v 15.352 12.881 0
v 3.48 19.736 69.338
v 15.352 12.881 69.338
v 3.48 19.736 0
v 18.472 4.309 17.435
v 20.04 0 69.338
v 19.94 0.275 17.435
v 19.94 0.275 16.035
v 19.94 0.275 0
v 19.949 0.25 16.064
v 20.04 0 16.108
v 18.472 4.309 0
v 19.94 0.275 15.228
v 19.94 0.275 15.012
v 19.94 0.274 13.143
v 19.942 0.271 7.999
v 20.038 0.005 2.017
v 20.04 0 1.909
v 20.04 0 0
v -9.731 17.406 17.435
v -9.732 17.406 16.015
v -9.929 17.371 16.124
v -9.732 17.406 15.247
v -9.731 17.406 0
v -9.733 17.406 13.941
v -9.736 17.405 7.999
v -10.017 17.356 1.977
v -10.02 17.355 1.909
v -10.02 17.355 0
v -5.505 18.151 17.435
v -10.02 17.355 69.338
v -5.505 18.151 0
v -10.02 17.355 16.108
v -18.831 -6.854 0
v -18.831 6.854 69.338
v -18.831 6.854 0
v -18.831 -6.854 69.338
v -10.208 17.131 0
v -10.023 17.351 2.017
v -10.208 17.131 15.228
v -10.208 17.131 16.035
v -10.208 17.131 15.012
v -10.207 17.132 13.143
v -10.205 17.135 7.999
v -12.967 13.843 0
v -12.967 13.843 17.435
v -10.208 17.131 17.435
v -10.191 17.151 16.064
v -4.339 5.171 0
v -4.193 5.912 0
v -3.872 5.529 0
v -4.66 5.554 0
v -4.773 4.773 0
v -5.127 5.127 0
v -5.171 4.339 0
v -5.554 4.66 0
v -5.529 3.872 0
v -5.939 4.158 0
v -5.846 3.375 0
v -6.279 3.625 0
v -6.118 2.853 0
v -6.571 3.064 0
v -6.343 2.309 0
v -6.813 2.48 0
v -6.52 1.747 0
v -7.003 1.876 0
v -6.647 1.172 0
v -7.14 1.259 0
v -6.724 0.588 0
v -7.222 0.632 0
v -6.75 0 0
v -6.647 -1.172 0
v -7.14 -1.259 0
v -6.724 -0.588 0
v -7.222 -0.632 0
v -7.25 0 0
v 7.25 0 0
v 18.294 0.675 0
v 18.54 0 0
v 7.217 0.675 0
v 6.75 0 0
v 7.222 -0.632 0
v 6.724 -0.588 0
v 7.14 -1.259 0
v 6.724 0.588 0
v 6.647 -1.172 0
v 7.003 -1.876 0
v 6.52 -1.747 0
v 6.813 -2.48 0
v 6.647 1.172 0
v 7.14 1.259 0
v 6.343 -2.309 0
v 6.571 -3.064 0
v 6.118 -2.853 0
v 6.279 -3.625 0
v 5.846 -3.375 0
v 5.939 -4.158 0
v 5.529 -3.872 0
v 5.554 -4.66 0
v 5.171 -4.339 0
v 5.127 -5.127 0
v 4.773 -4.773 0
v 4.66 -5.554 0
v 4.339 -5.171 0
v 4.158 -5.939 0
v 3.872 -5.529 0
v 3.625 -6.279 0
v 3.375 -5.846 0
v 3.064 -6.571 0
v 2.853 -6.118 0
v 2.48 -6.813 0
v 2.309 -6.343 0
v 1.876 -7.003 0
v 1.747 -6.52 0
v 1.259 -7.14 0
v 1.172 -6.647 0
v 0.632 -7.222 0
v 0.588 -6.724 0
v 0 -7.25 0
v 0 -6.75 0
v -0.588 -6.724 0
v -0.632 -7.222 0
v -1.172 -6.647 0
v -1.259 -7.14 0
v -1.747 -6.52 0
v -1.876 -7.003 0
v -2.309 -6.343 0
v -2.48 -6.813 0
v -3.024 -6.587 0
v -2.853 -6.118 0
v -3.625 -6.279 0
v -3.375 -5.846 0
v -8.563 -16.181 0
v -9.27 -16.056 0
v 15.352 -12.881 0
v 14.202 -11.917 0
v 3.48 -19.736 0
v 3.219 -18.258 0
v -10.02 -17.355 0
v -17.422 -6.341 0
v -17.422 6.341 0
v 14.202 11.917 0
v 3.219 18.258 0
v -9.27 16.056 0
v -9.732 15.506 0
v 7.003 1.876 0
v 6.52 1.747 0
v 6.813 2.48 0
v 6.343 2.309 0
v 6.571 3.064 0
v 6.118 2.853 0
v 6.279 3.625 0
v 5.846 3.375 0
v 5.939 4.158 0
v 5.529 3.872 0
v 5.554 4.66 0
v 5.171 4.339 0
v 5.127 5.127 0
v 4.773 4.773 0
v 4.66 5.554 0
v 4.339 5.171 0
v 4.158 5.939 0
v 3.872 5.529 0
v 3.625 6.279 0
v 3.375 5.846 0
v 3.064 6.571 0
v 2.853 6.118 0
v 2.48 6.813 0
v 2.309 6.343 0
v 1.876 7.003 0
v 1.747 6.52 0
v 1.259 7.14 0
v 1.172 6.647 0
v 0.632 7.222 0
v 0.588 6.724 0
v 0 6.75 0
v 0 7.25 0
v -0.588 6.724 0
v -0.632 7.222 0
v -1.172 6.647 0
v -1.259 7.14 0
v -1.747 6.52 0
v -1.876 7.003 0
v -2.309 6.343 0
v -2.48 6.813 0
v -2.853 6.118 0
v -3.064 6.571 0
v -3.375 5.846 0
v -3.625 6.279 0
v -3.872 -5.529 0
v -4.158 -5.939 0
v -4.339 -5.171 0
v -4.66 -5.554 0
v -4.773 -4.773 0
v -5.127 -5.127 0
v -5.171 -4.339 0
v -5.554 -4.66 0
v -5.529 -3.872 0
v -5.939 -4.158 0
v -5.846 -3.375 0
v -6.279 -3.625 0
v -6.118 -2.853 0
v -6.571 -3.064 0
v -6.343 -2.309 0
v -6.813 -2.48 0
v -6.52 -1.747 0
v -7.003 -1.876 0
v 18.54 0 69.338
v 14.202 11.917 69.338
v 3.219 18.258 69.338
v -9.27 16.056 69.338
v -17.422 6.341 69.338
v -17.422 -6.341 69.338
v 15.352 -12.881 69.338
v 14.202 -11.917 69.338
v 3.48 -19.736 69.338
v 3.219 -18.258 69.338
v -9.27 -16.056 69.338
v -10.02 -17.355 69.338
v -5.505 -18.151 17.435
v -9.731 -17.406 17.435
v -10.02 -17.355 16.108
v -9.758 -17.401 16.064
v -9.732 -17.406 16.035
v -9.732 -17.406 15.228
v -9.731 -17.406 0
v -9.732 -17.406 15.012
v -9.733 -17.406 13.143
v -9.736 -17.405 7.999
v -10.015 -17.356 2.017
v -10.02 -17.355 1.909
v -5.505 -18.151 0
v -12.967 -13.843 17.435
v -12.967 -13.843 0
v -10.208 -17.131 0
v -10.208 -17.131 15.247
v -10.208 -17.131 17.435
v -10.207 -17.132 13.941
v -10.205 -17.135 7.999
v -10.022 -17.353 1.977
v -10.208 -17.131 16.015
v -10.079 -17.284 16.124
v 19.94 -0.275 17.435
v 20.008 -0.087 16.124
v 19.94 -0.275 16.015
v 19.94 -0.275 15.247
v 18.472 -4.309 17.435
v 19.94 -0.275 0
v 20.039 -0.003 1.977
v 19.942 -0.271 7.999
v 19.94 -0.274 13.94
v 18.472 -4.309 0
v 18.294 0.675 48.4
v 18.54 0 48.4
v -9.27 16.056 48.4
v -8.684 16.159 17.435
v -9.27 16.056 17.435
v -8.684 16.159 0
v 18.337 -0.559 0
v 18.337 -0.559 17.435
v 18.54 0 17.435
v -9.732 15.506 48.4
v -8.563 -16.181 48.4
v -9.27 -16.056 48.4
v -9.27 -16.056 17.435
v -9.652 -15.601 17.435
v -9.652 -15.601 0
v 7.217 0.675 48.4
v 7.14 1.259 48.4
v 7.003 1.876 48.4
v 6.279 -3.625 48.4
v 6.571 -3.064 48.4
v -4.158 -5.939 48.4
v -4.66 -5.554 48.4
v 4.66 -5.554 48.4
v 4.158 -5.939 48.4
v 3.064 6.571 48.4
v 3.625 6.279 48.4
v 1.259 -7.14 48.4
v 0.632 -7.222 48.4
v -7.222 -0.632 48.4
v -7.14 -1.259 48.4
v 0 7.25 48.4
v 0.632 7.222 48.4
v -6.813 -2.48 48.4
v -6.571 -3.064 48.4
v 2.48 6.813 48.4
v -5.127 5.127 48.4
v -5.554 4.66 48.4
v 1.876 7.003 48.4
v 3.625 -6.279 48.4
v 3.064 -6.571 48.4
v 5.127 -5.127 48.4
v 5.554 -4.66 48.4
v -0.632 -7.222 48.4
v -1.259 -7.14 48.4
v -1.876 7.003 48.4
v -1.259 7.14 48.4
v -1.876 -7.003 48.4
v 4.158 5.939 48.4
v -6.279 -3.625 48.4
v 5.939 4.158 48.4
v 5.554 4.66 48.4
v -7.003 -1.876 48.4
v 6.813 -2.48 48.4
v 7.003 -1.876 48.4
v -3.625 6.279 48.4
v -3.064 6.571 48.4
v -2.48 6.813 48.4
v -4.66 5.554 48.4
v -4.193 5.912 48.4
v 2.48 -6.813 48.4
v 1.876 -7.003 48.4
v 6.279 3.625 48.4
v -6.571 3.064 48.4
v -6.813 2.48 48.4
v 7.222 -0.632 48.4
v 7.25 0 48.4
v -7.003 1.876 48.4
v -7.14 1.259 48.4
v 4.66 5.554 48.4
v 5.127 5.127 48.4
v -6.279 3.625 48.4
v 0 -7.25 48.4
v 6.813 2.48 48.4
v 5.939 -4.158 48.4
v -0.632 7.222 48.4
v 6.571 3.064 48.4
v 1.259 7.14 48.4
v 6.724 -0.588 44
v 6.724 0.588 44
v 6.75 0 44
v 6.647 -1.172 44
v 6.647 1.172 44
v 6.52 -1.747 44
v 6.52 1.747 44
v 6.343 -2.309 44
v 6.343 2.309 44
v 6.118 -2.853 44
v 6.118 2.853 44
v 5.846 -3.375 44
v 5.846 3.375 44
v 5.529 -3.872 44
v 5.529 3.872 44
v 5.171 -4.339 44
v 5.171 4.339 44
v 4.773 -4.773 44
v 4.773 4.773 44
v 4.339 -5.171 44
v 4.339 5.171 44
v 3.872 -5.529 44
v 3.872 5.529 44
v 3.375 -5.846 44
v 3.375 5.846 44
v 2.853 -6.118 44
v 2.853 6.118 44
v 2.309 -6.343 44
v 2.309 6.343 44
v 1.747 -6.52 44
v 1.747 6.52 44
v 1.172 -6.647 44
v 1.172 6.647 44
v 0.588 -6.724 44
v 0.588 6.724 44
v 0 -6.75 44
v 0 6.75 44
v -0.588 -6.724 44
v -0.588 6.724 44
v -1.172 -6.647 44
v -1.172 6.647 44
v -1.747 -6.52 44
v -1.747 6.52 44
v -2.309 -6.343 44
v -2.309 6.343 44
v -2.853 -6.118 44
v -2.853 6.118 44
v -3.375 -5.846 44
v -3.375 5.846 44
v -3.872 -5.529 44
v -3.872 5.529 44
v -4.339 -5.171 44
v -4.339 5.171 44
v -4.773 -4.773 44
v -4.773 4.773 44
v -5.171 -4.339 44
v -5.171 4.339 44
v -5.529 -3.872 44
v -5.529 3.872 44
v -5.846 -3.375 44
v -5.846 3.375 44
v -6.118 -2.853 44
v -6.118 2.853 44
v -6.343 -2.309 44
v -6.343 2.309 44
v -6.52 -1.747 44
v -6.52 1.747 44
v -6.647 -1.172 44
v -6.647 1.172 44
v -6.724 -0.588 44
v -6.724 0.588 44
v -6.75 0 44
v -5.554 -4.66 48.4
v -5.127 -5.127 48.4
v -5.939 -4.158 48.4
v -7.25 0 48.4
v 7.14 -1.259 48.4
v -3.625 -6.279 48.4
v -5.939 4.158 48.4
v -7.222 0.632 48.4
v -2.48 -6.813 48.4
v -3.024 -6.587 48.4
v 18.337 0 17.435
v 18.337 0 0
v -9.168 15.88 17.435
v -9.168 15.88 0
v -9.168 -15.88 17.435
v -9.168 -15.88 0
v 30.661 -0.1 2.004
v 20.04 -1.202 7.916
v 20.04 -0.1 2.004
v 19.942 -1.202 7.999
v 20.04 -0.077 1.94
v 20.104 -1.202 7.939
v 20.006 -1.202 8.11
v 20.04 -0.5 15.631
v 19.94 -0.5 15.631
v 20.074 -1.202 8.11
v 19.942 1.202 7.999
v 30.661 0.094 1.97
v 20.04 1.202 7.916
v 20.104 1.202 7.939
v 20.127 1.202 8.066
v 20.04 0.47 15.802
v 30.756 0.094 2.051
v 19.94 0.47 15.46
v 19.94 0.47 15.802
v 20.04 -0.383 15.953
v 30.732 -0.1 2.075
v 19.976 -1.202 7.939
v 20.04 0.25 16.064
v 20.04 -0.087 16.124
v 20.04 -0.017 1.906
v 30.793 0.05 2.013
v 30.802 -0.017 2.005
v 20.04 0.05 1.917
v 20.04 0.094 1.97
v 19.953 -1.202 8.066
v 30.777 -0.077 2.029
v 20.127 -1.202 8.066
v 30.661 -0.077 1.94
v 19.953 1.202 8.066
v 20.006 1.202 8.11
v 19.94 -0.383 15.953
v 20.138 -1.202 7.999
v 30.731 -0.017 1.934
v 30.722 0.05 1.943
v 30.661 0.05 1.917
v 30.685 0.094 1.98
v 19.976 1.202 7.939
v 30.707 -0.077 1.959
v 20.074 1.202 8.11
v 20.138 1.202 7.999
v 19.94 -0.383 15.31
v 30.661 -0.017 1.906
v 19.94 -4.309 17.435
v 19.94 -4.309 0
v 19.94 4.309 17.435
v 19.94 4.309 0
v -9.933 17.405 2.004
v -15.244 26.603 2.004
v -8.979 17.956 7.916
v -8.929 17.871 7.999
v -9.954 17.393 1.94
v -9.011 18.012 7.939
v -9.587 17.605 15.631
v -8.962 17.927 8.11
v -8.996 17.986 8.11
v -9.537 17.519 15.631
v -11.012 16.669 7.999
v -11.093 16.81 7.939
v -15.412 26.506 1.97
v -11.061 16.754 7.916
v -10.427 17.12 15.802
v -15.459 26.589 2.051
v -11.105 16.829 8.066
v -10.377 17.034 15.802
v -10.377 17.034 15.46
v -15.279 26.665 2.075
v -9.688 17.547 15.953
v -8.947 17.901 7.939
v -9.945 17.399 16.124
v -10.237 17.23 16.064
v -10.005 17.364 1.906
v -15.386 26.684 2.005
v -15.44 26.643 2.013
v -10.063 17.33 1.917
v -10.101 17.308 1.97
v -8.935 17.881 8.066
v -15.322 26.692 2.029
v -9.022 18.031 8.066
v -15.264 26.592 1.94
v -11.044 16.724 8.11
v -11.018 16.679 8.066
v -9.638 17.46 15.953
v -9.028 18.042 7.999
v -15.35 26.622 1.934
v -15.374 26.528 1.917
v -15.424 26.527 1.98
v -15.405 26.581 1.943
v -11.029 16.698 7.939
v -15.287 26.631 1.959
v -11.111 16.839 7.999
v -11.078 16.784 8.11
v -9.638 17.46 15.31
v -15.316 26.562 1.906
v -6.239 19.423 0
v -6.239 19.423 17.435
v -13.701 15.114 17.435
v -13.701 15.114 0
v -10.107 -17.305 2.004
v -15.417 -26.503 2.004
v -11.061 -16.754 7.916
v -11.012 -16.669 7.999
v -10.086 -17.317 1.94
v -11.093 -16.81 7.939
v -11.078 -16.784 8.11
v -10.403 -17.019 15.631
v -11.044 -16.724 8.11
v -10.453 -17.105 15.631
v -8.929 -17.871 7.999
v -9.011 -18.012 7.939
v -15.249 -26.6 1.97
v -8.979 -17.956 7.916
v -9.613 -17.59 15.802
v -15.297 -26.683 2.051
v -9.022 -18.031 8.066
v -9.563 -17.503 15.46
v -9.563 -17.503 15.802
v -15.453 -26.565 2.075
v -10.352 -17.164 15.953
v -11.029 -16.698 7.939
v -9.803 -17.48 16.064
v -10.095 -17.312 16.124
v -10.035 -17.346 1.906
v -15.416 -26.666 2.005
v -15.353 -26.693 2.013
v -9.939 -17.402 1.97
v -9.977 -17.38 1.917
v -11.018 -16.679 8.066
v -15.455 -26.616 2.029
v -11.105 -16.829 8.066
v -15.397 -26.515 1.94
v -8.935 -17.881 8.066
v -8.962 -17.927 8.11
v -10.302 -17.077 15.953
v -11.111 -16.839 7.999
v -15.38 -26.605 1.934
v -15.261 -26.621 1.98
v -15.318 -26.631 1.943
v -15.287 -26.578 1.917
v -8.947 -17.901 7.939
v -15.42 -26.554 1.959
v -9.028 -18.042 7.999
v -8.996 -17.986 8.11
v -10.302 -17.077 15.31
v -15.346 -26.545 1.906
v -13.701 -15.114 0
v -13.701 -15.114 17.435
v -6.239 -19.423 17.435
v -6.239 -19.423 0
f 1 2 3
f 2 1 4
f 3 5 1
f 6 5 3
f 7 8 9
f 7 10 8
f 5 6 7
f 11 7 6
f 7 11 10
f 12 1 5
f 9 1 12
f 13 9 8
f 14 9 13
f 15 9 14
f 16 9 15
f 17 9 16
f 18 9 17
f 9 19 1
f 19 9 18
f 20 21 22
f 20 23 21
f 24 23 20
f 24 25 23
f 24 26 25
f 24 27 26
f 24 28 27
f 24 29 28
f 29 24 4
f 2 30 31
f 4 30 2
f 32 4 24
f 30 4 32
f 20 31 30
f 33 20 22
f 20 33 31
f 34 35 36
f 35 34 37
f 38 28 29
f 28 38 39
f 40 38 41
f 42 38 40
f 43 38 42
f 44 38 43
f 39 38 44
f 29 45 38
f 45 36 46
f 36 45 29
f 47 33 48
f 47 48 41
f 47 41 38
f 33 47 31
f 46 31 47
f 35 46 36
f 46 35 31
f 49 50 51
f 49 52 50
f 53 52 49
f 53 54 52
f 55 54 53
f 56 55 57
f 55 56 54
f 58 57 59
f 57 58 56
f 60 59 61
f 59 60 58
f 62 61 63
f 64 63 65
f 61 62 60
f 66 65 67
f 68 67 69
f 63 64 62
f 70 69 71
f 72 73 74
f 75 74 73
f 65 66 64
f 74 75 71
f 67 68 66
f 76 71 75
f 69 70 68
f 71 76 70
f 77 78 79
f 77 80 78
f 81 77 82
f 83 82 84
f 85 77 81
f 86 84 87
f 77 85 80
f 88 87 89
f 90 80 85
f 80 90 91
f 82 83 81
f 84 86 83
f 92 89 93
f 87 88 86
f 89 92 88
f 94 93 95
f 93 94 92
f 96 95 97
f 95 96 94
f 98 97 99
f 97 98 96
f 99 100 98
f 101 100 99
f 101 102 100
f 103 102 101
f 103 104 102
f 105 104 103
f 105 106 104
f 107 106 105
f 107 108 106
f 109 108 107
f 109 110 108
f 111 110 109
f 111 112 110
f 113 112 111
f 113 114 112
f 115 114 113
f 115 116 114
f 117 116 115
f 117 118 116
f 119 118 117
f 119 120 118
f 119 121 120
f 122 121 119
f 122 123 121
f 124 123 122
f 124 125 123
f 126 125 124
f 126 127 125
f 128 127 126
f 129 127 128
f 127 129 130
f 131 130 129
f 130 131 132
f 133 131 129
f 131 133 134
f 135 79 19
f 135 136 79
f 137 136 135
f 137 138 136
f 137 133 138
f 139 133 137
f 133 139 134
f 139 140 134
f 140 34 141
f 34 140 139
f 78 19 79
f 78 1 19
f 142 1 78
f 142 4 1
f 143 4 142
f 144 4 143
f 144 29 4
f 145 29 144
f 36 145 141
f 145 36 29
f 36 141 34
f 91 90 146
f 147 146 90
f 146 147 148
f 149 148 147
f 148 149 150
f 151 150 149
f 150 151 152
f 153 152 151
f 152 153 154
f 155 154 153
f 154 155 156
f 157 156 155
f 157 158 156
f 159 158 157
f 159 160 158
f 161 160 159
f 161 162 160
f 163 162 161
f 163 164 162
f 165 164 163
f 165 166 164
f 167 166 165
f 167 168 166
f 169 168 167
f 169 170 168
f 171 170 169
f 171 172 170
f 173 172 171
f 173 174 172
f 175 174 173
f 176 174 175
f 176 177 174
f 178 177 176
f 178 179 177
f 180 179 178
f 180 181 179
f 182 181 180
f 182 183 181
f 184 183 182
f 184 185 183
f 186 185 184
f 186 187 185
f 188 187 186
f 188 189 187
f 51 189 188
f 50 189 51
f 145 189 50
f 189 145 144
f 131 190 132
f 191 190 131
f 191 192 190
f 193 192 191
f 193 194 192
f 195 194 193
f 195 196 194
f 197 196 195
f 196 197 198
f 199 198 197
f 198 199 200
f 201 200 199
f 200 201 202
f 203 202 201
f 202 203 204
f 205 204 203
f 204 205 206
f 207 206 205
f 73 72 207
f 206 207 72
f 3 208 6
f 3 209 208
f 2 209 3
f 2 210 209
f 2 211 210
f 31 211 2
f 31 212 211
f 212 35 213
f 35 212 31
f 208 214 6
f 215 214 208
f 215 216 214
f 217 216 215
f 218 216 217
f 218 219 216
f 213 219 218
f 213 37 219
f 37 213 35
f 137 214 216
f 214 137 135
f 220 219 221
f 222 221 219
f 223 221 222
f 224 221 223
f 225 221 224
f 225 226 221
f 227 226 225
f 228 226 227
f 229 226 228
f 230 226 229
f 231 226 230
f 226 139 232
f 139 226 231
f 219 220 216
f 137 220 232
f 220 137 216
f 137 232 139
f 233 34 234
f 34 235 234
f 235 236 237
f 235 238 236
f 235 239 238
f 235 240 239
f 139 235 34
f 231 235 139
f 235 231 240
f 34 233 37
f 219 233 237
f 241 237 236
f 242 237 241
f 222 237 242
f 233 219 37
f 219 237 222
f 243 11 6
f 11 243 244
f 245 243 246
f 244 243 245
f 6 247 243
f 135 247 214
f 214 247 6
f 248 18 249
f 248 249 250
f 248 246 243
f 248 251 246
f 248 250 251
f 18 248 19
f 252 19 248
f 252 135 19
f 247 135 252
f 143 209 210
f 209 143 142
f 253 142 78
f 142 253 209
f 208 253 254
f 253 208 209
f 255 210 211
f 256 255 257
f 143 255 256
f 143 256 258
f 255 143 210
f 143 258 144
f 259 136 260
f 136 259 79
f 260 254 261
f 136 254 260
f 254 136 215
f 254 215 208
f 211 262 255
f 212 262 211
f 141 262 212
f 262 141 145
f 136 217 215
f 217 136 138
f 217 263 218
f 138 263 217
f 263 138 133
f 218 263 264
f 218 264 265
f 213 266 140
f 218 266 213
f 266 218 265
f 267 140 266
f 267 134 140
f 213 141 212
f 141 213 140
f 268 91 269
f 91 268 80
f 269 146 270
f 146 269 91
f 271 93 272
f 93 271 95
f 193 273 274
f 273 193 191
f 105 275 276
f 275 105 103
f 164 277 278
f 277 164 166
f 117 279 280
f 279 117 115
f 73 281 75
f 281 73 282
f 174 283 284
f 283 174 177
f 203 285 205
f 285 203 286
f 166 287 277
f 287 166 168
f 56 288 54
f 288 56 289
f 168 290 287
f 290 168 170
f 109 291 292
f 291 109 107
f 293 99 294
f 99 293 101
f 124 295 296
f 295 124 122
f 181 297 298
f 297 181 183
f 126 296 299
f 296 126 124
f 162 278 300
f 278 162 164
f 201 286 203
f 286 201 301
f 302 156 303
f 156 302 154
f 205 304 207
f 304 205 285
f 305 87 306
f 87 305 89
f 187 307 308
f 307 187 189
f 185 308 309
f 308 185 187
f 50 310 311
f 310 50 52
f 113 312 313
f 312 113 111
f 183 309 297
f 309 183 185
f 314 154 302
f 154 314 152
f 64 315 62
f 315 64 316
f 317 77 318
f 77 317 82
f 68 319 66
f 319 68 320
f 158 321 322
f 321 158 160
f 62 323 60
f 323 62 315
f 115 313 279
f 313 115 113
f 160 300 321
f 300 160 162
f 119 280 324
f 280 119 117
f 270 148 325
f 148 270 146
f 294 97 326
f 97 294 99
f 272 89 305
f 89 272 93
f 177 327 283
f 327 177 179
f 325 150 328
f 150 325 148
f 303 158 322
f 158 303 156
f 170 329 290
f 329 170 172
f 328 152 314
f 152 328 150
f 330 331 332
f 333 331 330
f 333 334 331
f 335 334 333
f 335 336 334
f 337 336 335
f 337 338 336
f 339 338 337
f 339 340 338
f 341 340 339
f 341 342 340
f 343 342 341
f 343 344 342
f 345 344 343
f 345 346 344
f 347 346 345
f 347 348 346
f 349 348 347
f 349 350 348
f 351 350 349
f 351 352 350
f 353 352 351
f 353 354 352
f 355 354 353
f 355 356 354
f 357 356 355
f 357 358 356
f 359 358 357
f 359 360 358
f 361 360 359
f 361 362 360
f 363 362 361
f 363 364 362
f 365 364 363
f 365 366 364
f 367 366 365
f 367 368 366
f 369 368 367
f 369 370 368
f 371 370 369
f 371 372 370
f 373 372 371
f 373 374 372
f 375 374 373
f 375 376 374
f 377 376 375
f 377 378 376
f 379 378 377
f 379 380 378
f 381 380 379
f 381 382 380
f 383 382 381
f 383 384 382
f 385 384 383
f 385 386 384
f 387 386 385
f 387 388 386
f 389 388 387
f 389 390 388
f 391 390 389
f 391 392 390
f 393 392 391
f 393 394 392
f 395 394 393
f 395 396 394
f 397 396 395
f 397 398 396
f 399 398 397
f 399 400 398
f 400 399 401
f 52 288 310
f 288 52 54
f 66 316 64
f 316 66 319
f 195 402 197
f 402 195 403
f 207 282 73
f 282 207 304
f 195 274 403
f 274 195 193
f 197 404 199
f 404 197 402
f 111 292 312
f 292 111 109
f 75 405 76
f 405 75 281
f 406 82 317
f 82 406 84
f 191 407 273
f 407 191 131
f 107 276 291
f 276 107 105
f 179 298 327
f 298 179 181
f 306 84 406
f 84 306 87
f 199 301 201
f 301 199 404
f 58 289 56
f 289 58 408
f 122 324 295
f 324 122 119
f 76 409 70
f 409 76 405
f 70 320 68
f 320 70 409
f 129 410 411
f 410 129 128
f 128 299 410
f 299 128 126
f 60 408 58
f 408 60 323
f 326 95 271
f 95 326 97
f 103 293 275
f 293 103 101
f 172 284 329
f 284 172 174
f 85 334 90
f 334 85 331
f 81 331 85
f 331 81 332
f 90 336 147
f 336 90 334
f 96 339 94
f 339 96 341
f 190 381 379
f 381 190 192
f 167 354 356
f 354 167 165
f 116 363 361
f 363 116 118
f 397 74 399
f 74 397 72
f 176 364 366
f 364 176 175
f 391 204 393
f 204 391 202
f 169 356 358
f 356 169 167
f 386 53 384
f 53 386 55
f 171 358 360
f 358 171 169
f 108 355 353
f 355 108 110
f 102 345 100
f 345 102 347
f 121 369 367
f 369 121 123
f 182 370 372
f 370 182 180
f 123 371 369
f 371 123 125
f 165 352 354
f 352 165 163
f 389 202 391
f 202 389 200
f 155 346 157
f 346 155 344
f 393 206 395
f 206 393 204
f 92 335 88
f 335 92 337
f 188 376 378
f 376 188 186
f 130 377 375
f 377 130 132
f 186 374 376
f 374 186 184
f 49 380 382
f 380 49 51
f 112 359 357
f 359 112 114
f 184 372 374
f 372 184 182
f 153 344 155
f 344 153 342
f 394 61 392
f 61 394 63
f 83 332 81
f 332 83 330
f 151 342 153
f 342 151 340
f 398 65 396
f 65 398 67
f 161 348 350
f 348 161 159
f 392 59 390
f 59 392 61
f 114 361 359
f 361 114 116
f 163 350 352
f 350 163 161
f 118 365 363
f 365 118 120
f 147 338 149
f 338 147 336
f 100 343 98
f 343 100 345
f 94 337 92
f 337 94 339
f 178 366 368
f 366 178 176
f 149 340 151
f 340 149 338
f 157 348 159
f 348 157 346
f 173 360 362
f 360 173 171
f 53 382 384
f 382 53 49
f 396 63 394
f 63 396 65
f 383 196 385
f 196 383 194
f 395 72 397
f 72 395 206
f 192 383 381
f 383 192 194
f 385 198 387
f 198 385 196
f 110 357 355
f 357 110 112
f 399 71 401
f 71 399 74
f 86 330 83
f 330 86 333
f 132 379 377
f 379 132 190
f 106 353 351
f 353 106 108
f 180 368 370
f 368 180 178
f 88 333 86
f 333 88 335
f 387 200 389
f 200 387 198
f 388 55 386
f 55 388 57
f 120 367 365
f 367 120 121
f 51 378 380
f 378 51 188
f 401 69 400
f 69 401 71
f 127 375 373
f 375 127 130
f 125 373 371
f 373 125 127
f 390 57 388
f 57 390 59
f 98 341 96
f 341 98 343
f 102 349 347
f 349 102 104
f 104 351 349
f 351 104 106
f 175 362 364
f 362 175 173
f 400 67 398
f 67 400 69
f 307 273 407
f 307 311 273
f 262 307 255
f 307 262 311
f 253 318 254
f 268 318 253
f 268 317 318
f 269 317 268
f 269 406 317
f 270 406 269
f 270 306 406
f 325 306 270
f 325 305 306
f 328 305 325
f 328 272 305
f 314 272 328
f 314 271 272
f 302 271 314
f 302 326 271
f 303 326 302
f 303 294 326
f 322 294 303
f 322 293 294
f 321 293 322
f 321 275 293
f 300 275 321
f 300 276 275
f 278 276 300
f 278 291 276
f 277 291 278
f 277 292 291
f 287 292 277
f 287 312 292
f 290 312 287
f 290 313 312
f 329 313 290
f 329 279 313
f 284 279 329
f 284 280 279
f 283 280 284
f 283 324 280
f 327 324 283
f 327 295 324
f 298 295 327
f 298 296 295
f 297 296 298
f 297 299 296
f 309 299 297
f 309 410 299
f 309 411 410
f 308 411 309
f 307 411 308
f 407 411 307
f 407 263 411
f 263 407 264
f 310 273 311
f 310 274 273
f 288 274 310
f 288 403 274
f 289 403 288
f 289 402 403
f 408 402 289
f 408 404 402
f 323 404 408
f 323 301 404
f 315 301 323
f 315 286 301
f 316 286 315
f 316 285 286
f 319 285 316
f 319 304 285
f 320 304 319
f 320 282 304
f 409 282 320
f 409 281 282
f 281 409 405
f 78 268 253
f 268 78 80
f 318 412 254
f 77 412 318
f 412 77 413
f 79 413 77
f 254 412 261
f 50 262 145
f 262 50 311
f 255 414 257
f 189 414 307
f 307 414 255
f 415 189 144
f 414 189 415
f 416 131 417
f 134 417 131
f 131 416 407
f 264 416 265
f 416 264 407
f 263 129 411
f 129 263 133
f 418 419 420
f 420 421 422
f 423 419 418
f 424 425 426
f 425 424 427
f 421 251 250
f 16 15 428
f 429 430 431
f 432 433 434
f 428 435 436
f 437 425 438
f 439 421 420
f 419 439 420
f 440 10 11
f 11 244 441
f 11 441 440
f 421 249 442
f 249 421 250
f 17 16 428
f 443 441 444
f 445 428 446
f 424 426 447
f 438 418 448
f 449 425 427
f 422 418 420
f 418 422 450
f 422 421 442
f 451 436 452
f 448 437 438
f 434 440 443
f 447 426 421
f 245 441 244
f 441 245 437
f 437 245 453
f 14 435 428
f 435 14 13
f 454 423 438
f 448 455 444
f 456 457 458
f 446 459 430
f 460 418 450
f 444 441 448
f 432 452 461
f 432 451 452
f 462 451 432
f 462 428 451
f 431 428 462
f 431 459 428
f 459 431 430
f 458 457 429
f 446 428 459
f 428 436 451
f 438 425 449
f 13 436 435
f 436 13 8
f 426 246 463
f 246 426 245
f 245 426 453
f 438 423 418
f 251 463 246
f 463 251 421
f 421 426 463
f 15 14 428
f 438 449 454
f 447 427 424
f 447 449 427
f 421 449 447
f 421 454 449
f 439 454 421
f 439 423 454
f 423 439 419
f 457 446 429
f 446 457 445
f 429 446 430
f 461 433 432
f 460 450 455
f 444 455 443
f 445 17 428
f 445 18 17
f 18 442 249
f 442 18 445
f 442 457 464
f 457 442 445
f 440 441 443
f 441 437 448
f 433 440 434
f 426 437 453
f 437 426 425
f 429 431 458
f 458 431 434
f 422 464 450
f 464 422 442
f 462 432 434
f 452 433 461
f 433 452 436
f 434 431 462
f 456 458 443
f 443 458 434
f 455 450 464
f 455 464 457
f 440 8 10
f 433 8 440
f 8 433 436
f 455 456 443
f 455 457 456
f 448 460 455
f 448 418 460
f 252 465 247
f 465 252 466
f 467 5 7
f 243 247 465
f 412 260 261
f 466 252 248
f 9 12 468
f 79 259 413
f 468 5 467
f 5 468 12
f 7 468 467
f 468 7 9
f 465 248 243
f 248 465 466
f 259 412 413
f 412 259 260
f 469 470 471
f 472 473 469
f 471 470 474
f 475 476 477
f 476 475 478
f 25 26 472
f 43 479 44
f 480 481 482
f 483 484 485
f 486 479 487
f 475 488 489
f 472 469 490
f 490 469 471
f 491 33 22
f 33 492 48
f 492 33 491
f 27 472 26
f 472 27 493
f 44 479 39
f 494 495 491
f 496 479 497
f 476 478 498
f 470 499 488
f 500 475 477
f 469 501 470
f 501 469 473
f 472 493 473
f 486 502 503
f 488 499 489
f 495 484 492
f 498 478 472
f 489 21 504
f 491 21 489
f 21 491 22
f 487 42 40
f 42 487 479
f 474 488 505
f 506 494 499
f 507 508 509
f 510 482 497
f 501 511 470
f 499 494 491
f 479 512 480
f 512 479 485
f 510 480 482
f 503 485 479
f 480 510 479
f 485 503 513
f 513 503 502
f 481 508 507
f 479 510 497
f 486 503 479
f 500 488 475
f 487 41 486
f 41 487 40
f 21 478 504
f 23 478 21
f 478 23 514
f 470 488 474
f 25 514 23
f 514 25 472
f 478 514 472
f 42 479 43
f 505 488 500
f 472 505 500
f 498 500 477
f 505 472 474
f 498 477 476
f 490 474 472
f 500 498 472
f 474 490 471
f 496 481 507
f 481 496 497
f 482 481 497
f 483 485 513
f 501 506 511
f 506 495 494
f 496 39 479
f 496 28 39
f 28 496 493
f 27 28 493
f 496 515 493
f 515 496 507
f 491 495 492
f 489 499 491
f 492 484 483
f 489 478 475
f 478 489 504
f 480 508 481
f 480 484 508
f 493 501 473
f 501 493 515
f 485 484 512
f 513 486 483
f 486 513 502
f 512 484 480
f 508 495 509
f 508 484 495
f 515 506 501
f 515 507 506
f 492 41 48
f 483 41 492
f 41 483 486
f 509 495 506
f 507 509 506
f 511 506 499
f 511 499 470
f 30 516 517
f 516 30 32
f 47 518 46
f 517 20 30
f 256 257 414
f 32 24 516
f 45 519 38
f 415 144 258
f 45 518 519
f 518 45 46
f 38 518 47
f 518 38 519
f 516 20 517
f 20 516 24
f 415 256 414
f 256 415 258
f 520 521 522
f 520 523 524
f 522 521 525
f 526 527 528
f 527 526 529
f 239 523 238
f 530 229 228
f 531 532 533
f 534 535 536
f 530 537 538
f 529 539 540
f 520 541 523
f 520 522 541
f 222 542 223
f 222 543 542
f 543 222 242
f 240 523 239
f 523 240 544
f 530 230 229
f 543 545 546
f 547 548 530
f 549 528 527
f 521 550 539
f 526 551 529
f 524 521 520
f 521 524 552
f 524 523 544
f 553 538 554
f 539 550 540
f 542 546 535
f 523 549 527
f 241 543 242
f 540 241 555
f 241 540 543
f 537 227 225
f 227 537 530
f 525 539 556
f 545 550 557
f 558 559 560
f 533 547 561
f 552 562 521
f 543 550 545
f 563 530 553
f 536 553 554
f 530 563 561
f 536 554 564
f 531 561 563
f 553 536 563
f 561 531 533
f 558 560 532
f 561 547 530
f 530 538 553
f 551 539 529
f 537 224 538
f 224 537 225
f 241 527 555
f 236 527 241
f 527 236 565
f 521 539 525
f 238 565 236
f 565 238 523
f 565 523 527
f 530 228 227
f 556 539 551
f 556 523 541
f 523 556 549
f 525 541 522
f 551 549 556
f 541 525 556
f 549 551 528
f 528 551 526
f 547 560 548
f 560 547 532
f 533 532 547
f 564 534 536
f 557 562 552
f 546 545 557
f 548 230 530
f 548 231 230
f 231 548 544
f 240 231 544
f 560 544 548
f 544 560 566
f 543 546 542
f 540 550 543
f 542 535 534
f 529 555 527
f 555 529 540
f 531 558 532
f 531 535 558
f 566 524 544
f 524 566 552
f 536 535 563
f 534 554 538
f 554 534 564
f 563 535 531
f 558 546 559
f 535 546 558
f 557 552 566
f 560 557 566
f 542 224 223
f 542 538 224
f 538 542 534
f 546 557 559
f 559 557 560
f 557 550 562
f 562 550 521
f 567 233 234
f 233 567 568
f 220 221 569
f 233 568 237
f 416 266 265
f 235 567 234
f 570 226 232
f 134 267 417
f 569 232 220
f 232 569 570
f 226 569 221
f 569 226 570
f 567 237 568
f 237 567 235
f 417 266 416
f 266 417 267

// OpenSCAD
//pershing model
//parameteric (mostly) - so it can scale up and down

/*todo -
0) finish all scaling issues
1) engine blocks - 6.6cm up for d&e24 motors.
2) review scaling - seems short
3) stage connectors

motor dimensions:
    mini d=13mm, l=4.4cm
    standard d=18mm, l=7cm
    c11&d d=24, l=7cm
    24e d=24, l=9.5cm
    e&f d=29mm, l=11.5cm
*/

$fn=9;
motorRadius=6.75; //9.25; //use r=12.25 for d & e engines
motorHeight=44;
scale=0.050; //I wanna build a 1/10th scale model. 'cause that what will fit in the printer.

//so, rad is the radius of the warhead base; the missle is 25% larger
//and we want to work in missle radius
rad=0.8*501*scale;  //this is the radius of the missle at this scale

translate([0,0,0]){stage(rad, 1, 3.46);}
//translate([0,0,3.46*rad]){stage(rad, 2, 3.28);}
//translate([0,0,6.72*rad]){top(rad);}

// components - for testing
//fin(rad, 2);
//puck();



module tube(hgt){
    difference(){
        cylinder(r=2.5,h=hgt);
        cylinder(r=1.7,h=hgt);
    }  
}
module stage (rad, stage, height){
    //simple cylinder with 3 fins
    //make separate module for fins and mating surfaces
    stageHeight=height*rad;

    //outter wall
    difference(){
        cylinder(r=rad, h=stageHeight);
        cylinder(r=rad-1.5,h=stageHeight);
    }

    //cable covers
    //rotate([0,0,180]){translate([rad,0,0]){cableCover(rad, stage);}}

    //motor tube - comment out for non-flying models
    
    if (stage==1){
        difference(){
        $fn=72;
        cylinder(r=motorRadius+0.5, h=motorHeight);
        cylinder(r=motorRadius, h=motorHeight); 
    } 
            //motor plug - comment out for non-flying models
    
    if (stage==1){
        $fn=72;
        translate([0,0,motorHeight]){
            cylinder(r=motorRadius+0.5, h=0.1*motorHeight);
        } 
    }

    
    //motor tube mounts - comment out for non-flying models
    
    for (angle=[0:120:240]){
        rotate([0,0,angle]){
            translate([motorRadius,0,0]){
                #cube([rad-motorRadius-1,motorRadius*.1,1.1*motorHeight]);  
            }
        }
    }
} 
    
    for (angle=[0:120:240]){
        rotate([0,0,angle]){
            translate([rad,0,rad*.1]){rotate([0,0,-90]){fin(rad, stage);}}
        }
    } 
}

module GandC(rad){
    //conical section for guidance and control
}

module warhead(rad){
}

module matingClamps(rad){
}

module fin(rad, stage){
    if (stage==1){
        union(){       
            hull(){
                translate([0,0,0]){rotate([-90,0,0]){cylinder(r=.1,h=.53*rad);}}  //missle edge bottom
                translate([0,.53*rad,0]){rotate([-45,0,0]){cylinder(r=.1,h=.1);}} //fin tip
                translate([0,0,.68*rad]){rotate([90,0,0]){cylinder(r=.5,h=.10);}} //missle edge top
                translate([-.06*rad,0,.30*rad]){rotate([0,90,0]){cylinder(r=.1,h=.12*rad);}} //missle edge wide spot
            }
            translate([0,0,rad*-0.1]){rotate([0,0,0]){vanePad(rad, 0.87);}}
         }
    }
    if (stage==2){
        union(){    
            hull(){ //these were a wedge  .57 (tall) x .62
                translate([-rad*.06,0,0]){cube([rad*.12, rad*.62, 1]);}; //trailing edge
                translate([0,0,.57*rad]){rotate([-90,0,0]){cylinder(r=.2,h=rad*.62);}}// leading edge
            }
            translate([0,0,rad*-0.1]){rotate([0,0,0]){vanePad(rad, 0.75);}}      
        }
    }
}

module vanePad(rad, padHeight){
    //todo - chamber leading edge 17degree
    translate([-rad*0.2150,-rad*0.085,0]){
        cube([rad*0.43,rad*0.08,rad*padHeight]);
        }
    }
    
module cableCover(rad, stage){
    //todo - chamfer top and bottom edges to 15 degrees.
    /* todo two - launching ideas
    idea 1) make a hole thru the cable covers to serve as launch tube
    idea 2) modify profile (of cable cover) to serve as launch rail?  Slip inside 20x20 extrusion?
    idea 3) build a launch adapter that screws to cable covers (it's a reinforced body area - could be just a couple eye screws)
    idea 4) add a internal tube and make it go thru the top.  Come out cable cover??
    */
    
    if (stage==1){
        translate([0,-rad*.105,rad*0.75]){
            difference(){
                cube([rad*0.07, rad*0.21, rad*2.68]);
                rotate([0,15,0]){cube([rad,rad,rad]);}
                translate([0,0,rad*2.68]){rotate([0,75,0]){cube([rad,rad,rad]);}}
            }
        }
    }
    if (stage==2){
         translate([0,-rad*.105,rad]){
            difference(){   
                cube([rad*0.07, rad*0.21, rad*1.93]);
                rotate([0,15,0]){cube([rad,rad,rad]);}
                translate([0,0,rad*1.93]){rotate([0,75,0]){cube([rad,rad,rad]);}}
            }
        }
    }
}

    
module matingRing(rad){
}

module top(rad){
    //modelling the gnc and warhead together...
    difference(){
    hull(){
        cylinder(r=rad, h=.1); //bottom of piece
        translate([0,0,rad*5]){cylinder(r=.5*rad, h=.1);} // angle change near tip
        translate([0,0,rad*6.17]){sphere(r=rad*0.1);}// tip of warhead - 0.03 is too pointy, using 0.1
    }
    cylinder(r=rad, h=.1);
}
//translate([0,0,rad*1.59]){cylinder(r=rad*0.845, h=rad*.03);} //top of gnc marker
}


module puck(){
    //joins stage 1&2
    //76mmx20mm with 25mm center hole
    //and 3 1.5mm slots for stage 2
    
    //no top or bottom skins to reduce weight
    
    
    difference(){
        cylinder(d=76,h=20);
        cylinder(d=27,h=20);
        
        for (angle=[0:120:240]){
        rotate([0,0,angle]){
            translate([12,0,10]){
                cube([rad-motorRadius,1,10]);  
            }
        }
    }
    }
    }
